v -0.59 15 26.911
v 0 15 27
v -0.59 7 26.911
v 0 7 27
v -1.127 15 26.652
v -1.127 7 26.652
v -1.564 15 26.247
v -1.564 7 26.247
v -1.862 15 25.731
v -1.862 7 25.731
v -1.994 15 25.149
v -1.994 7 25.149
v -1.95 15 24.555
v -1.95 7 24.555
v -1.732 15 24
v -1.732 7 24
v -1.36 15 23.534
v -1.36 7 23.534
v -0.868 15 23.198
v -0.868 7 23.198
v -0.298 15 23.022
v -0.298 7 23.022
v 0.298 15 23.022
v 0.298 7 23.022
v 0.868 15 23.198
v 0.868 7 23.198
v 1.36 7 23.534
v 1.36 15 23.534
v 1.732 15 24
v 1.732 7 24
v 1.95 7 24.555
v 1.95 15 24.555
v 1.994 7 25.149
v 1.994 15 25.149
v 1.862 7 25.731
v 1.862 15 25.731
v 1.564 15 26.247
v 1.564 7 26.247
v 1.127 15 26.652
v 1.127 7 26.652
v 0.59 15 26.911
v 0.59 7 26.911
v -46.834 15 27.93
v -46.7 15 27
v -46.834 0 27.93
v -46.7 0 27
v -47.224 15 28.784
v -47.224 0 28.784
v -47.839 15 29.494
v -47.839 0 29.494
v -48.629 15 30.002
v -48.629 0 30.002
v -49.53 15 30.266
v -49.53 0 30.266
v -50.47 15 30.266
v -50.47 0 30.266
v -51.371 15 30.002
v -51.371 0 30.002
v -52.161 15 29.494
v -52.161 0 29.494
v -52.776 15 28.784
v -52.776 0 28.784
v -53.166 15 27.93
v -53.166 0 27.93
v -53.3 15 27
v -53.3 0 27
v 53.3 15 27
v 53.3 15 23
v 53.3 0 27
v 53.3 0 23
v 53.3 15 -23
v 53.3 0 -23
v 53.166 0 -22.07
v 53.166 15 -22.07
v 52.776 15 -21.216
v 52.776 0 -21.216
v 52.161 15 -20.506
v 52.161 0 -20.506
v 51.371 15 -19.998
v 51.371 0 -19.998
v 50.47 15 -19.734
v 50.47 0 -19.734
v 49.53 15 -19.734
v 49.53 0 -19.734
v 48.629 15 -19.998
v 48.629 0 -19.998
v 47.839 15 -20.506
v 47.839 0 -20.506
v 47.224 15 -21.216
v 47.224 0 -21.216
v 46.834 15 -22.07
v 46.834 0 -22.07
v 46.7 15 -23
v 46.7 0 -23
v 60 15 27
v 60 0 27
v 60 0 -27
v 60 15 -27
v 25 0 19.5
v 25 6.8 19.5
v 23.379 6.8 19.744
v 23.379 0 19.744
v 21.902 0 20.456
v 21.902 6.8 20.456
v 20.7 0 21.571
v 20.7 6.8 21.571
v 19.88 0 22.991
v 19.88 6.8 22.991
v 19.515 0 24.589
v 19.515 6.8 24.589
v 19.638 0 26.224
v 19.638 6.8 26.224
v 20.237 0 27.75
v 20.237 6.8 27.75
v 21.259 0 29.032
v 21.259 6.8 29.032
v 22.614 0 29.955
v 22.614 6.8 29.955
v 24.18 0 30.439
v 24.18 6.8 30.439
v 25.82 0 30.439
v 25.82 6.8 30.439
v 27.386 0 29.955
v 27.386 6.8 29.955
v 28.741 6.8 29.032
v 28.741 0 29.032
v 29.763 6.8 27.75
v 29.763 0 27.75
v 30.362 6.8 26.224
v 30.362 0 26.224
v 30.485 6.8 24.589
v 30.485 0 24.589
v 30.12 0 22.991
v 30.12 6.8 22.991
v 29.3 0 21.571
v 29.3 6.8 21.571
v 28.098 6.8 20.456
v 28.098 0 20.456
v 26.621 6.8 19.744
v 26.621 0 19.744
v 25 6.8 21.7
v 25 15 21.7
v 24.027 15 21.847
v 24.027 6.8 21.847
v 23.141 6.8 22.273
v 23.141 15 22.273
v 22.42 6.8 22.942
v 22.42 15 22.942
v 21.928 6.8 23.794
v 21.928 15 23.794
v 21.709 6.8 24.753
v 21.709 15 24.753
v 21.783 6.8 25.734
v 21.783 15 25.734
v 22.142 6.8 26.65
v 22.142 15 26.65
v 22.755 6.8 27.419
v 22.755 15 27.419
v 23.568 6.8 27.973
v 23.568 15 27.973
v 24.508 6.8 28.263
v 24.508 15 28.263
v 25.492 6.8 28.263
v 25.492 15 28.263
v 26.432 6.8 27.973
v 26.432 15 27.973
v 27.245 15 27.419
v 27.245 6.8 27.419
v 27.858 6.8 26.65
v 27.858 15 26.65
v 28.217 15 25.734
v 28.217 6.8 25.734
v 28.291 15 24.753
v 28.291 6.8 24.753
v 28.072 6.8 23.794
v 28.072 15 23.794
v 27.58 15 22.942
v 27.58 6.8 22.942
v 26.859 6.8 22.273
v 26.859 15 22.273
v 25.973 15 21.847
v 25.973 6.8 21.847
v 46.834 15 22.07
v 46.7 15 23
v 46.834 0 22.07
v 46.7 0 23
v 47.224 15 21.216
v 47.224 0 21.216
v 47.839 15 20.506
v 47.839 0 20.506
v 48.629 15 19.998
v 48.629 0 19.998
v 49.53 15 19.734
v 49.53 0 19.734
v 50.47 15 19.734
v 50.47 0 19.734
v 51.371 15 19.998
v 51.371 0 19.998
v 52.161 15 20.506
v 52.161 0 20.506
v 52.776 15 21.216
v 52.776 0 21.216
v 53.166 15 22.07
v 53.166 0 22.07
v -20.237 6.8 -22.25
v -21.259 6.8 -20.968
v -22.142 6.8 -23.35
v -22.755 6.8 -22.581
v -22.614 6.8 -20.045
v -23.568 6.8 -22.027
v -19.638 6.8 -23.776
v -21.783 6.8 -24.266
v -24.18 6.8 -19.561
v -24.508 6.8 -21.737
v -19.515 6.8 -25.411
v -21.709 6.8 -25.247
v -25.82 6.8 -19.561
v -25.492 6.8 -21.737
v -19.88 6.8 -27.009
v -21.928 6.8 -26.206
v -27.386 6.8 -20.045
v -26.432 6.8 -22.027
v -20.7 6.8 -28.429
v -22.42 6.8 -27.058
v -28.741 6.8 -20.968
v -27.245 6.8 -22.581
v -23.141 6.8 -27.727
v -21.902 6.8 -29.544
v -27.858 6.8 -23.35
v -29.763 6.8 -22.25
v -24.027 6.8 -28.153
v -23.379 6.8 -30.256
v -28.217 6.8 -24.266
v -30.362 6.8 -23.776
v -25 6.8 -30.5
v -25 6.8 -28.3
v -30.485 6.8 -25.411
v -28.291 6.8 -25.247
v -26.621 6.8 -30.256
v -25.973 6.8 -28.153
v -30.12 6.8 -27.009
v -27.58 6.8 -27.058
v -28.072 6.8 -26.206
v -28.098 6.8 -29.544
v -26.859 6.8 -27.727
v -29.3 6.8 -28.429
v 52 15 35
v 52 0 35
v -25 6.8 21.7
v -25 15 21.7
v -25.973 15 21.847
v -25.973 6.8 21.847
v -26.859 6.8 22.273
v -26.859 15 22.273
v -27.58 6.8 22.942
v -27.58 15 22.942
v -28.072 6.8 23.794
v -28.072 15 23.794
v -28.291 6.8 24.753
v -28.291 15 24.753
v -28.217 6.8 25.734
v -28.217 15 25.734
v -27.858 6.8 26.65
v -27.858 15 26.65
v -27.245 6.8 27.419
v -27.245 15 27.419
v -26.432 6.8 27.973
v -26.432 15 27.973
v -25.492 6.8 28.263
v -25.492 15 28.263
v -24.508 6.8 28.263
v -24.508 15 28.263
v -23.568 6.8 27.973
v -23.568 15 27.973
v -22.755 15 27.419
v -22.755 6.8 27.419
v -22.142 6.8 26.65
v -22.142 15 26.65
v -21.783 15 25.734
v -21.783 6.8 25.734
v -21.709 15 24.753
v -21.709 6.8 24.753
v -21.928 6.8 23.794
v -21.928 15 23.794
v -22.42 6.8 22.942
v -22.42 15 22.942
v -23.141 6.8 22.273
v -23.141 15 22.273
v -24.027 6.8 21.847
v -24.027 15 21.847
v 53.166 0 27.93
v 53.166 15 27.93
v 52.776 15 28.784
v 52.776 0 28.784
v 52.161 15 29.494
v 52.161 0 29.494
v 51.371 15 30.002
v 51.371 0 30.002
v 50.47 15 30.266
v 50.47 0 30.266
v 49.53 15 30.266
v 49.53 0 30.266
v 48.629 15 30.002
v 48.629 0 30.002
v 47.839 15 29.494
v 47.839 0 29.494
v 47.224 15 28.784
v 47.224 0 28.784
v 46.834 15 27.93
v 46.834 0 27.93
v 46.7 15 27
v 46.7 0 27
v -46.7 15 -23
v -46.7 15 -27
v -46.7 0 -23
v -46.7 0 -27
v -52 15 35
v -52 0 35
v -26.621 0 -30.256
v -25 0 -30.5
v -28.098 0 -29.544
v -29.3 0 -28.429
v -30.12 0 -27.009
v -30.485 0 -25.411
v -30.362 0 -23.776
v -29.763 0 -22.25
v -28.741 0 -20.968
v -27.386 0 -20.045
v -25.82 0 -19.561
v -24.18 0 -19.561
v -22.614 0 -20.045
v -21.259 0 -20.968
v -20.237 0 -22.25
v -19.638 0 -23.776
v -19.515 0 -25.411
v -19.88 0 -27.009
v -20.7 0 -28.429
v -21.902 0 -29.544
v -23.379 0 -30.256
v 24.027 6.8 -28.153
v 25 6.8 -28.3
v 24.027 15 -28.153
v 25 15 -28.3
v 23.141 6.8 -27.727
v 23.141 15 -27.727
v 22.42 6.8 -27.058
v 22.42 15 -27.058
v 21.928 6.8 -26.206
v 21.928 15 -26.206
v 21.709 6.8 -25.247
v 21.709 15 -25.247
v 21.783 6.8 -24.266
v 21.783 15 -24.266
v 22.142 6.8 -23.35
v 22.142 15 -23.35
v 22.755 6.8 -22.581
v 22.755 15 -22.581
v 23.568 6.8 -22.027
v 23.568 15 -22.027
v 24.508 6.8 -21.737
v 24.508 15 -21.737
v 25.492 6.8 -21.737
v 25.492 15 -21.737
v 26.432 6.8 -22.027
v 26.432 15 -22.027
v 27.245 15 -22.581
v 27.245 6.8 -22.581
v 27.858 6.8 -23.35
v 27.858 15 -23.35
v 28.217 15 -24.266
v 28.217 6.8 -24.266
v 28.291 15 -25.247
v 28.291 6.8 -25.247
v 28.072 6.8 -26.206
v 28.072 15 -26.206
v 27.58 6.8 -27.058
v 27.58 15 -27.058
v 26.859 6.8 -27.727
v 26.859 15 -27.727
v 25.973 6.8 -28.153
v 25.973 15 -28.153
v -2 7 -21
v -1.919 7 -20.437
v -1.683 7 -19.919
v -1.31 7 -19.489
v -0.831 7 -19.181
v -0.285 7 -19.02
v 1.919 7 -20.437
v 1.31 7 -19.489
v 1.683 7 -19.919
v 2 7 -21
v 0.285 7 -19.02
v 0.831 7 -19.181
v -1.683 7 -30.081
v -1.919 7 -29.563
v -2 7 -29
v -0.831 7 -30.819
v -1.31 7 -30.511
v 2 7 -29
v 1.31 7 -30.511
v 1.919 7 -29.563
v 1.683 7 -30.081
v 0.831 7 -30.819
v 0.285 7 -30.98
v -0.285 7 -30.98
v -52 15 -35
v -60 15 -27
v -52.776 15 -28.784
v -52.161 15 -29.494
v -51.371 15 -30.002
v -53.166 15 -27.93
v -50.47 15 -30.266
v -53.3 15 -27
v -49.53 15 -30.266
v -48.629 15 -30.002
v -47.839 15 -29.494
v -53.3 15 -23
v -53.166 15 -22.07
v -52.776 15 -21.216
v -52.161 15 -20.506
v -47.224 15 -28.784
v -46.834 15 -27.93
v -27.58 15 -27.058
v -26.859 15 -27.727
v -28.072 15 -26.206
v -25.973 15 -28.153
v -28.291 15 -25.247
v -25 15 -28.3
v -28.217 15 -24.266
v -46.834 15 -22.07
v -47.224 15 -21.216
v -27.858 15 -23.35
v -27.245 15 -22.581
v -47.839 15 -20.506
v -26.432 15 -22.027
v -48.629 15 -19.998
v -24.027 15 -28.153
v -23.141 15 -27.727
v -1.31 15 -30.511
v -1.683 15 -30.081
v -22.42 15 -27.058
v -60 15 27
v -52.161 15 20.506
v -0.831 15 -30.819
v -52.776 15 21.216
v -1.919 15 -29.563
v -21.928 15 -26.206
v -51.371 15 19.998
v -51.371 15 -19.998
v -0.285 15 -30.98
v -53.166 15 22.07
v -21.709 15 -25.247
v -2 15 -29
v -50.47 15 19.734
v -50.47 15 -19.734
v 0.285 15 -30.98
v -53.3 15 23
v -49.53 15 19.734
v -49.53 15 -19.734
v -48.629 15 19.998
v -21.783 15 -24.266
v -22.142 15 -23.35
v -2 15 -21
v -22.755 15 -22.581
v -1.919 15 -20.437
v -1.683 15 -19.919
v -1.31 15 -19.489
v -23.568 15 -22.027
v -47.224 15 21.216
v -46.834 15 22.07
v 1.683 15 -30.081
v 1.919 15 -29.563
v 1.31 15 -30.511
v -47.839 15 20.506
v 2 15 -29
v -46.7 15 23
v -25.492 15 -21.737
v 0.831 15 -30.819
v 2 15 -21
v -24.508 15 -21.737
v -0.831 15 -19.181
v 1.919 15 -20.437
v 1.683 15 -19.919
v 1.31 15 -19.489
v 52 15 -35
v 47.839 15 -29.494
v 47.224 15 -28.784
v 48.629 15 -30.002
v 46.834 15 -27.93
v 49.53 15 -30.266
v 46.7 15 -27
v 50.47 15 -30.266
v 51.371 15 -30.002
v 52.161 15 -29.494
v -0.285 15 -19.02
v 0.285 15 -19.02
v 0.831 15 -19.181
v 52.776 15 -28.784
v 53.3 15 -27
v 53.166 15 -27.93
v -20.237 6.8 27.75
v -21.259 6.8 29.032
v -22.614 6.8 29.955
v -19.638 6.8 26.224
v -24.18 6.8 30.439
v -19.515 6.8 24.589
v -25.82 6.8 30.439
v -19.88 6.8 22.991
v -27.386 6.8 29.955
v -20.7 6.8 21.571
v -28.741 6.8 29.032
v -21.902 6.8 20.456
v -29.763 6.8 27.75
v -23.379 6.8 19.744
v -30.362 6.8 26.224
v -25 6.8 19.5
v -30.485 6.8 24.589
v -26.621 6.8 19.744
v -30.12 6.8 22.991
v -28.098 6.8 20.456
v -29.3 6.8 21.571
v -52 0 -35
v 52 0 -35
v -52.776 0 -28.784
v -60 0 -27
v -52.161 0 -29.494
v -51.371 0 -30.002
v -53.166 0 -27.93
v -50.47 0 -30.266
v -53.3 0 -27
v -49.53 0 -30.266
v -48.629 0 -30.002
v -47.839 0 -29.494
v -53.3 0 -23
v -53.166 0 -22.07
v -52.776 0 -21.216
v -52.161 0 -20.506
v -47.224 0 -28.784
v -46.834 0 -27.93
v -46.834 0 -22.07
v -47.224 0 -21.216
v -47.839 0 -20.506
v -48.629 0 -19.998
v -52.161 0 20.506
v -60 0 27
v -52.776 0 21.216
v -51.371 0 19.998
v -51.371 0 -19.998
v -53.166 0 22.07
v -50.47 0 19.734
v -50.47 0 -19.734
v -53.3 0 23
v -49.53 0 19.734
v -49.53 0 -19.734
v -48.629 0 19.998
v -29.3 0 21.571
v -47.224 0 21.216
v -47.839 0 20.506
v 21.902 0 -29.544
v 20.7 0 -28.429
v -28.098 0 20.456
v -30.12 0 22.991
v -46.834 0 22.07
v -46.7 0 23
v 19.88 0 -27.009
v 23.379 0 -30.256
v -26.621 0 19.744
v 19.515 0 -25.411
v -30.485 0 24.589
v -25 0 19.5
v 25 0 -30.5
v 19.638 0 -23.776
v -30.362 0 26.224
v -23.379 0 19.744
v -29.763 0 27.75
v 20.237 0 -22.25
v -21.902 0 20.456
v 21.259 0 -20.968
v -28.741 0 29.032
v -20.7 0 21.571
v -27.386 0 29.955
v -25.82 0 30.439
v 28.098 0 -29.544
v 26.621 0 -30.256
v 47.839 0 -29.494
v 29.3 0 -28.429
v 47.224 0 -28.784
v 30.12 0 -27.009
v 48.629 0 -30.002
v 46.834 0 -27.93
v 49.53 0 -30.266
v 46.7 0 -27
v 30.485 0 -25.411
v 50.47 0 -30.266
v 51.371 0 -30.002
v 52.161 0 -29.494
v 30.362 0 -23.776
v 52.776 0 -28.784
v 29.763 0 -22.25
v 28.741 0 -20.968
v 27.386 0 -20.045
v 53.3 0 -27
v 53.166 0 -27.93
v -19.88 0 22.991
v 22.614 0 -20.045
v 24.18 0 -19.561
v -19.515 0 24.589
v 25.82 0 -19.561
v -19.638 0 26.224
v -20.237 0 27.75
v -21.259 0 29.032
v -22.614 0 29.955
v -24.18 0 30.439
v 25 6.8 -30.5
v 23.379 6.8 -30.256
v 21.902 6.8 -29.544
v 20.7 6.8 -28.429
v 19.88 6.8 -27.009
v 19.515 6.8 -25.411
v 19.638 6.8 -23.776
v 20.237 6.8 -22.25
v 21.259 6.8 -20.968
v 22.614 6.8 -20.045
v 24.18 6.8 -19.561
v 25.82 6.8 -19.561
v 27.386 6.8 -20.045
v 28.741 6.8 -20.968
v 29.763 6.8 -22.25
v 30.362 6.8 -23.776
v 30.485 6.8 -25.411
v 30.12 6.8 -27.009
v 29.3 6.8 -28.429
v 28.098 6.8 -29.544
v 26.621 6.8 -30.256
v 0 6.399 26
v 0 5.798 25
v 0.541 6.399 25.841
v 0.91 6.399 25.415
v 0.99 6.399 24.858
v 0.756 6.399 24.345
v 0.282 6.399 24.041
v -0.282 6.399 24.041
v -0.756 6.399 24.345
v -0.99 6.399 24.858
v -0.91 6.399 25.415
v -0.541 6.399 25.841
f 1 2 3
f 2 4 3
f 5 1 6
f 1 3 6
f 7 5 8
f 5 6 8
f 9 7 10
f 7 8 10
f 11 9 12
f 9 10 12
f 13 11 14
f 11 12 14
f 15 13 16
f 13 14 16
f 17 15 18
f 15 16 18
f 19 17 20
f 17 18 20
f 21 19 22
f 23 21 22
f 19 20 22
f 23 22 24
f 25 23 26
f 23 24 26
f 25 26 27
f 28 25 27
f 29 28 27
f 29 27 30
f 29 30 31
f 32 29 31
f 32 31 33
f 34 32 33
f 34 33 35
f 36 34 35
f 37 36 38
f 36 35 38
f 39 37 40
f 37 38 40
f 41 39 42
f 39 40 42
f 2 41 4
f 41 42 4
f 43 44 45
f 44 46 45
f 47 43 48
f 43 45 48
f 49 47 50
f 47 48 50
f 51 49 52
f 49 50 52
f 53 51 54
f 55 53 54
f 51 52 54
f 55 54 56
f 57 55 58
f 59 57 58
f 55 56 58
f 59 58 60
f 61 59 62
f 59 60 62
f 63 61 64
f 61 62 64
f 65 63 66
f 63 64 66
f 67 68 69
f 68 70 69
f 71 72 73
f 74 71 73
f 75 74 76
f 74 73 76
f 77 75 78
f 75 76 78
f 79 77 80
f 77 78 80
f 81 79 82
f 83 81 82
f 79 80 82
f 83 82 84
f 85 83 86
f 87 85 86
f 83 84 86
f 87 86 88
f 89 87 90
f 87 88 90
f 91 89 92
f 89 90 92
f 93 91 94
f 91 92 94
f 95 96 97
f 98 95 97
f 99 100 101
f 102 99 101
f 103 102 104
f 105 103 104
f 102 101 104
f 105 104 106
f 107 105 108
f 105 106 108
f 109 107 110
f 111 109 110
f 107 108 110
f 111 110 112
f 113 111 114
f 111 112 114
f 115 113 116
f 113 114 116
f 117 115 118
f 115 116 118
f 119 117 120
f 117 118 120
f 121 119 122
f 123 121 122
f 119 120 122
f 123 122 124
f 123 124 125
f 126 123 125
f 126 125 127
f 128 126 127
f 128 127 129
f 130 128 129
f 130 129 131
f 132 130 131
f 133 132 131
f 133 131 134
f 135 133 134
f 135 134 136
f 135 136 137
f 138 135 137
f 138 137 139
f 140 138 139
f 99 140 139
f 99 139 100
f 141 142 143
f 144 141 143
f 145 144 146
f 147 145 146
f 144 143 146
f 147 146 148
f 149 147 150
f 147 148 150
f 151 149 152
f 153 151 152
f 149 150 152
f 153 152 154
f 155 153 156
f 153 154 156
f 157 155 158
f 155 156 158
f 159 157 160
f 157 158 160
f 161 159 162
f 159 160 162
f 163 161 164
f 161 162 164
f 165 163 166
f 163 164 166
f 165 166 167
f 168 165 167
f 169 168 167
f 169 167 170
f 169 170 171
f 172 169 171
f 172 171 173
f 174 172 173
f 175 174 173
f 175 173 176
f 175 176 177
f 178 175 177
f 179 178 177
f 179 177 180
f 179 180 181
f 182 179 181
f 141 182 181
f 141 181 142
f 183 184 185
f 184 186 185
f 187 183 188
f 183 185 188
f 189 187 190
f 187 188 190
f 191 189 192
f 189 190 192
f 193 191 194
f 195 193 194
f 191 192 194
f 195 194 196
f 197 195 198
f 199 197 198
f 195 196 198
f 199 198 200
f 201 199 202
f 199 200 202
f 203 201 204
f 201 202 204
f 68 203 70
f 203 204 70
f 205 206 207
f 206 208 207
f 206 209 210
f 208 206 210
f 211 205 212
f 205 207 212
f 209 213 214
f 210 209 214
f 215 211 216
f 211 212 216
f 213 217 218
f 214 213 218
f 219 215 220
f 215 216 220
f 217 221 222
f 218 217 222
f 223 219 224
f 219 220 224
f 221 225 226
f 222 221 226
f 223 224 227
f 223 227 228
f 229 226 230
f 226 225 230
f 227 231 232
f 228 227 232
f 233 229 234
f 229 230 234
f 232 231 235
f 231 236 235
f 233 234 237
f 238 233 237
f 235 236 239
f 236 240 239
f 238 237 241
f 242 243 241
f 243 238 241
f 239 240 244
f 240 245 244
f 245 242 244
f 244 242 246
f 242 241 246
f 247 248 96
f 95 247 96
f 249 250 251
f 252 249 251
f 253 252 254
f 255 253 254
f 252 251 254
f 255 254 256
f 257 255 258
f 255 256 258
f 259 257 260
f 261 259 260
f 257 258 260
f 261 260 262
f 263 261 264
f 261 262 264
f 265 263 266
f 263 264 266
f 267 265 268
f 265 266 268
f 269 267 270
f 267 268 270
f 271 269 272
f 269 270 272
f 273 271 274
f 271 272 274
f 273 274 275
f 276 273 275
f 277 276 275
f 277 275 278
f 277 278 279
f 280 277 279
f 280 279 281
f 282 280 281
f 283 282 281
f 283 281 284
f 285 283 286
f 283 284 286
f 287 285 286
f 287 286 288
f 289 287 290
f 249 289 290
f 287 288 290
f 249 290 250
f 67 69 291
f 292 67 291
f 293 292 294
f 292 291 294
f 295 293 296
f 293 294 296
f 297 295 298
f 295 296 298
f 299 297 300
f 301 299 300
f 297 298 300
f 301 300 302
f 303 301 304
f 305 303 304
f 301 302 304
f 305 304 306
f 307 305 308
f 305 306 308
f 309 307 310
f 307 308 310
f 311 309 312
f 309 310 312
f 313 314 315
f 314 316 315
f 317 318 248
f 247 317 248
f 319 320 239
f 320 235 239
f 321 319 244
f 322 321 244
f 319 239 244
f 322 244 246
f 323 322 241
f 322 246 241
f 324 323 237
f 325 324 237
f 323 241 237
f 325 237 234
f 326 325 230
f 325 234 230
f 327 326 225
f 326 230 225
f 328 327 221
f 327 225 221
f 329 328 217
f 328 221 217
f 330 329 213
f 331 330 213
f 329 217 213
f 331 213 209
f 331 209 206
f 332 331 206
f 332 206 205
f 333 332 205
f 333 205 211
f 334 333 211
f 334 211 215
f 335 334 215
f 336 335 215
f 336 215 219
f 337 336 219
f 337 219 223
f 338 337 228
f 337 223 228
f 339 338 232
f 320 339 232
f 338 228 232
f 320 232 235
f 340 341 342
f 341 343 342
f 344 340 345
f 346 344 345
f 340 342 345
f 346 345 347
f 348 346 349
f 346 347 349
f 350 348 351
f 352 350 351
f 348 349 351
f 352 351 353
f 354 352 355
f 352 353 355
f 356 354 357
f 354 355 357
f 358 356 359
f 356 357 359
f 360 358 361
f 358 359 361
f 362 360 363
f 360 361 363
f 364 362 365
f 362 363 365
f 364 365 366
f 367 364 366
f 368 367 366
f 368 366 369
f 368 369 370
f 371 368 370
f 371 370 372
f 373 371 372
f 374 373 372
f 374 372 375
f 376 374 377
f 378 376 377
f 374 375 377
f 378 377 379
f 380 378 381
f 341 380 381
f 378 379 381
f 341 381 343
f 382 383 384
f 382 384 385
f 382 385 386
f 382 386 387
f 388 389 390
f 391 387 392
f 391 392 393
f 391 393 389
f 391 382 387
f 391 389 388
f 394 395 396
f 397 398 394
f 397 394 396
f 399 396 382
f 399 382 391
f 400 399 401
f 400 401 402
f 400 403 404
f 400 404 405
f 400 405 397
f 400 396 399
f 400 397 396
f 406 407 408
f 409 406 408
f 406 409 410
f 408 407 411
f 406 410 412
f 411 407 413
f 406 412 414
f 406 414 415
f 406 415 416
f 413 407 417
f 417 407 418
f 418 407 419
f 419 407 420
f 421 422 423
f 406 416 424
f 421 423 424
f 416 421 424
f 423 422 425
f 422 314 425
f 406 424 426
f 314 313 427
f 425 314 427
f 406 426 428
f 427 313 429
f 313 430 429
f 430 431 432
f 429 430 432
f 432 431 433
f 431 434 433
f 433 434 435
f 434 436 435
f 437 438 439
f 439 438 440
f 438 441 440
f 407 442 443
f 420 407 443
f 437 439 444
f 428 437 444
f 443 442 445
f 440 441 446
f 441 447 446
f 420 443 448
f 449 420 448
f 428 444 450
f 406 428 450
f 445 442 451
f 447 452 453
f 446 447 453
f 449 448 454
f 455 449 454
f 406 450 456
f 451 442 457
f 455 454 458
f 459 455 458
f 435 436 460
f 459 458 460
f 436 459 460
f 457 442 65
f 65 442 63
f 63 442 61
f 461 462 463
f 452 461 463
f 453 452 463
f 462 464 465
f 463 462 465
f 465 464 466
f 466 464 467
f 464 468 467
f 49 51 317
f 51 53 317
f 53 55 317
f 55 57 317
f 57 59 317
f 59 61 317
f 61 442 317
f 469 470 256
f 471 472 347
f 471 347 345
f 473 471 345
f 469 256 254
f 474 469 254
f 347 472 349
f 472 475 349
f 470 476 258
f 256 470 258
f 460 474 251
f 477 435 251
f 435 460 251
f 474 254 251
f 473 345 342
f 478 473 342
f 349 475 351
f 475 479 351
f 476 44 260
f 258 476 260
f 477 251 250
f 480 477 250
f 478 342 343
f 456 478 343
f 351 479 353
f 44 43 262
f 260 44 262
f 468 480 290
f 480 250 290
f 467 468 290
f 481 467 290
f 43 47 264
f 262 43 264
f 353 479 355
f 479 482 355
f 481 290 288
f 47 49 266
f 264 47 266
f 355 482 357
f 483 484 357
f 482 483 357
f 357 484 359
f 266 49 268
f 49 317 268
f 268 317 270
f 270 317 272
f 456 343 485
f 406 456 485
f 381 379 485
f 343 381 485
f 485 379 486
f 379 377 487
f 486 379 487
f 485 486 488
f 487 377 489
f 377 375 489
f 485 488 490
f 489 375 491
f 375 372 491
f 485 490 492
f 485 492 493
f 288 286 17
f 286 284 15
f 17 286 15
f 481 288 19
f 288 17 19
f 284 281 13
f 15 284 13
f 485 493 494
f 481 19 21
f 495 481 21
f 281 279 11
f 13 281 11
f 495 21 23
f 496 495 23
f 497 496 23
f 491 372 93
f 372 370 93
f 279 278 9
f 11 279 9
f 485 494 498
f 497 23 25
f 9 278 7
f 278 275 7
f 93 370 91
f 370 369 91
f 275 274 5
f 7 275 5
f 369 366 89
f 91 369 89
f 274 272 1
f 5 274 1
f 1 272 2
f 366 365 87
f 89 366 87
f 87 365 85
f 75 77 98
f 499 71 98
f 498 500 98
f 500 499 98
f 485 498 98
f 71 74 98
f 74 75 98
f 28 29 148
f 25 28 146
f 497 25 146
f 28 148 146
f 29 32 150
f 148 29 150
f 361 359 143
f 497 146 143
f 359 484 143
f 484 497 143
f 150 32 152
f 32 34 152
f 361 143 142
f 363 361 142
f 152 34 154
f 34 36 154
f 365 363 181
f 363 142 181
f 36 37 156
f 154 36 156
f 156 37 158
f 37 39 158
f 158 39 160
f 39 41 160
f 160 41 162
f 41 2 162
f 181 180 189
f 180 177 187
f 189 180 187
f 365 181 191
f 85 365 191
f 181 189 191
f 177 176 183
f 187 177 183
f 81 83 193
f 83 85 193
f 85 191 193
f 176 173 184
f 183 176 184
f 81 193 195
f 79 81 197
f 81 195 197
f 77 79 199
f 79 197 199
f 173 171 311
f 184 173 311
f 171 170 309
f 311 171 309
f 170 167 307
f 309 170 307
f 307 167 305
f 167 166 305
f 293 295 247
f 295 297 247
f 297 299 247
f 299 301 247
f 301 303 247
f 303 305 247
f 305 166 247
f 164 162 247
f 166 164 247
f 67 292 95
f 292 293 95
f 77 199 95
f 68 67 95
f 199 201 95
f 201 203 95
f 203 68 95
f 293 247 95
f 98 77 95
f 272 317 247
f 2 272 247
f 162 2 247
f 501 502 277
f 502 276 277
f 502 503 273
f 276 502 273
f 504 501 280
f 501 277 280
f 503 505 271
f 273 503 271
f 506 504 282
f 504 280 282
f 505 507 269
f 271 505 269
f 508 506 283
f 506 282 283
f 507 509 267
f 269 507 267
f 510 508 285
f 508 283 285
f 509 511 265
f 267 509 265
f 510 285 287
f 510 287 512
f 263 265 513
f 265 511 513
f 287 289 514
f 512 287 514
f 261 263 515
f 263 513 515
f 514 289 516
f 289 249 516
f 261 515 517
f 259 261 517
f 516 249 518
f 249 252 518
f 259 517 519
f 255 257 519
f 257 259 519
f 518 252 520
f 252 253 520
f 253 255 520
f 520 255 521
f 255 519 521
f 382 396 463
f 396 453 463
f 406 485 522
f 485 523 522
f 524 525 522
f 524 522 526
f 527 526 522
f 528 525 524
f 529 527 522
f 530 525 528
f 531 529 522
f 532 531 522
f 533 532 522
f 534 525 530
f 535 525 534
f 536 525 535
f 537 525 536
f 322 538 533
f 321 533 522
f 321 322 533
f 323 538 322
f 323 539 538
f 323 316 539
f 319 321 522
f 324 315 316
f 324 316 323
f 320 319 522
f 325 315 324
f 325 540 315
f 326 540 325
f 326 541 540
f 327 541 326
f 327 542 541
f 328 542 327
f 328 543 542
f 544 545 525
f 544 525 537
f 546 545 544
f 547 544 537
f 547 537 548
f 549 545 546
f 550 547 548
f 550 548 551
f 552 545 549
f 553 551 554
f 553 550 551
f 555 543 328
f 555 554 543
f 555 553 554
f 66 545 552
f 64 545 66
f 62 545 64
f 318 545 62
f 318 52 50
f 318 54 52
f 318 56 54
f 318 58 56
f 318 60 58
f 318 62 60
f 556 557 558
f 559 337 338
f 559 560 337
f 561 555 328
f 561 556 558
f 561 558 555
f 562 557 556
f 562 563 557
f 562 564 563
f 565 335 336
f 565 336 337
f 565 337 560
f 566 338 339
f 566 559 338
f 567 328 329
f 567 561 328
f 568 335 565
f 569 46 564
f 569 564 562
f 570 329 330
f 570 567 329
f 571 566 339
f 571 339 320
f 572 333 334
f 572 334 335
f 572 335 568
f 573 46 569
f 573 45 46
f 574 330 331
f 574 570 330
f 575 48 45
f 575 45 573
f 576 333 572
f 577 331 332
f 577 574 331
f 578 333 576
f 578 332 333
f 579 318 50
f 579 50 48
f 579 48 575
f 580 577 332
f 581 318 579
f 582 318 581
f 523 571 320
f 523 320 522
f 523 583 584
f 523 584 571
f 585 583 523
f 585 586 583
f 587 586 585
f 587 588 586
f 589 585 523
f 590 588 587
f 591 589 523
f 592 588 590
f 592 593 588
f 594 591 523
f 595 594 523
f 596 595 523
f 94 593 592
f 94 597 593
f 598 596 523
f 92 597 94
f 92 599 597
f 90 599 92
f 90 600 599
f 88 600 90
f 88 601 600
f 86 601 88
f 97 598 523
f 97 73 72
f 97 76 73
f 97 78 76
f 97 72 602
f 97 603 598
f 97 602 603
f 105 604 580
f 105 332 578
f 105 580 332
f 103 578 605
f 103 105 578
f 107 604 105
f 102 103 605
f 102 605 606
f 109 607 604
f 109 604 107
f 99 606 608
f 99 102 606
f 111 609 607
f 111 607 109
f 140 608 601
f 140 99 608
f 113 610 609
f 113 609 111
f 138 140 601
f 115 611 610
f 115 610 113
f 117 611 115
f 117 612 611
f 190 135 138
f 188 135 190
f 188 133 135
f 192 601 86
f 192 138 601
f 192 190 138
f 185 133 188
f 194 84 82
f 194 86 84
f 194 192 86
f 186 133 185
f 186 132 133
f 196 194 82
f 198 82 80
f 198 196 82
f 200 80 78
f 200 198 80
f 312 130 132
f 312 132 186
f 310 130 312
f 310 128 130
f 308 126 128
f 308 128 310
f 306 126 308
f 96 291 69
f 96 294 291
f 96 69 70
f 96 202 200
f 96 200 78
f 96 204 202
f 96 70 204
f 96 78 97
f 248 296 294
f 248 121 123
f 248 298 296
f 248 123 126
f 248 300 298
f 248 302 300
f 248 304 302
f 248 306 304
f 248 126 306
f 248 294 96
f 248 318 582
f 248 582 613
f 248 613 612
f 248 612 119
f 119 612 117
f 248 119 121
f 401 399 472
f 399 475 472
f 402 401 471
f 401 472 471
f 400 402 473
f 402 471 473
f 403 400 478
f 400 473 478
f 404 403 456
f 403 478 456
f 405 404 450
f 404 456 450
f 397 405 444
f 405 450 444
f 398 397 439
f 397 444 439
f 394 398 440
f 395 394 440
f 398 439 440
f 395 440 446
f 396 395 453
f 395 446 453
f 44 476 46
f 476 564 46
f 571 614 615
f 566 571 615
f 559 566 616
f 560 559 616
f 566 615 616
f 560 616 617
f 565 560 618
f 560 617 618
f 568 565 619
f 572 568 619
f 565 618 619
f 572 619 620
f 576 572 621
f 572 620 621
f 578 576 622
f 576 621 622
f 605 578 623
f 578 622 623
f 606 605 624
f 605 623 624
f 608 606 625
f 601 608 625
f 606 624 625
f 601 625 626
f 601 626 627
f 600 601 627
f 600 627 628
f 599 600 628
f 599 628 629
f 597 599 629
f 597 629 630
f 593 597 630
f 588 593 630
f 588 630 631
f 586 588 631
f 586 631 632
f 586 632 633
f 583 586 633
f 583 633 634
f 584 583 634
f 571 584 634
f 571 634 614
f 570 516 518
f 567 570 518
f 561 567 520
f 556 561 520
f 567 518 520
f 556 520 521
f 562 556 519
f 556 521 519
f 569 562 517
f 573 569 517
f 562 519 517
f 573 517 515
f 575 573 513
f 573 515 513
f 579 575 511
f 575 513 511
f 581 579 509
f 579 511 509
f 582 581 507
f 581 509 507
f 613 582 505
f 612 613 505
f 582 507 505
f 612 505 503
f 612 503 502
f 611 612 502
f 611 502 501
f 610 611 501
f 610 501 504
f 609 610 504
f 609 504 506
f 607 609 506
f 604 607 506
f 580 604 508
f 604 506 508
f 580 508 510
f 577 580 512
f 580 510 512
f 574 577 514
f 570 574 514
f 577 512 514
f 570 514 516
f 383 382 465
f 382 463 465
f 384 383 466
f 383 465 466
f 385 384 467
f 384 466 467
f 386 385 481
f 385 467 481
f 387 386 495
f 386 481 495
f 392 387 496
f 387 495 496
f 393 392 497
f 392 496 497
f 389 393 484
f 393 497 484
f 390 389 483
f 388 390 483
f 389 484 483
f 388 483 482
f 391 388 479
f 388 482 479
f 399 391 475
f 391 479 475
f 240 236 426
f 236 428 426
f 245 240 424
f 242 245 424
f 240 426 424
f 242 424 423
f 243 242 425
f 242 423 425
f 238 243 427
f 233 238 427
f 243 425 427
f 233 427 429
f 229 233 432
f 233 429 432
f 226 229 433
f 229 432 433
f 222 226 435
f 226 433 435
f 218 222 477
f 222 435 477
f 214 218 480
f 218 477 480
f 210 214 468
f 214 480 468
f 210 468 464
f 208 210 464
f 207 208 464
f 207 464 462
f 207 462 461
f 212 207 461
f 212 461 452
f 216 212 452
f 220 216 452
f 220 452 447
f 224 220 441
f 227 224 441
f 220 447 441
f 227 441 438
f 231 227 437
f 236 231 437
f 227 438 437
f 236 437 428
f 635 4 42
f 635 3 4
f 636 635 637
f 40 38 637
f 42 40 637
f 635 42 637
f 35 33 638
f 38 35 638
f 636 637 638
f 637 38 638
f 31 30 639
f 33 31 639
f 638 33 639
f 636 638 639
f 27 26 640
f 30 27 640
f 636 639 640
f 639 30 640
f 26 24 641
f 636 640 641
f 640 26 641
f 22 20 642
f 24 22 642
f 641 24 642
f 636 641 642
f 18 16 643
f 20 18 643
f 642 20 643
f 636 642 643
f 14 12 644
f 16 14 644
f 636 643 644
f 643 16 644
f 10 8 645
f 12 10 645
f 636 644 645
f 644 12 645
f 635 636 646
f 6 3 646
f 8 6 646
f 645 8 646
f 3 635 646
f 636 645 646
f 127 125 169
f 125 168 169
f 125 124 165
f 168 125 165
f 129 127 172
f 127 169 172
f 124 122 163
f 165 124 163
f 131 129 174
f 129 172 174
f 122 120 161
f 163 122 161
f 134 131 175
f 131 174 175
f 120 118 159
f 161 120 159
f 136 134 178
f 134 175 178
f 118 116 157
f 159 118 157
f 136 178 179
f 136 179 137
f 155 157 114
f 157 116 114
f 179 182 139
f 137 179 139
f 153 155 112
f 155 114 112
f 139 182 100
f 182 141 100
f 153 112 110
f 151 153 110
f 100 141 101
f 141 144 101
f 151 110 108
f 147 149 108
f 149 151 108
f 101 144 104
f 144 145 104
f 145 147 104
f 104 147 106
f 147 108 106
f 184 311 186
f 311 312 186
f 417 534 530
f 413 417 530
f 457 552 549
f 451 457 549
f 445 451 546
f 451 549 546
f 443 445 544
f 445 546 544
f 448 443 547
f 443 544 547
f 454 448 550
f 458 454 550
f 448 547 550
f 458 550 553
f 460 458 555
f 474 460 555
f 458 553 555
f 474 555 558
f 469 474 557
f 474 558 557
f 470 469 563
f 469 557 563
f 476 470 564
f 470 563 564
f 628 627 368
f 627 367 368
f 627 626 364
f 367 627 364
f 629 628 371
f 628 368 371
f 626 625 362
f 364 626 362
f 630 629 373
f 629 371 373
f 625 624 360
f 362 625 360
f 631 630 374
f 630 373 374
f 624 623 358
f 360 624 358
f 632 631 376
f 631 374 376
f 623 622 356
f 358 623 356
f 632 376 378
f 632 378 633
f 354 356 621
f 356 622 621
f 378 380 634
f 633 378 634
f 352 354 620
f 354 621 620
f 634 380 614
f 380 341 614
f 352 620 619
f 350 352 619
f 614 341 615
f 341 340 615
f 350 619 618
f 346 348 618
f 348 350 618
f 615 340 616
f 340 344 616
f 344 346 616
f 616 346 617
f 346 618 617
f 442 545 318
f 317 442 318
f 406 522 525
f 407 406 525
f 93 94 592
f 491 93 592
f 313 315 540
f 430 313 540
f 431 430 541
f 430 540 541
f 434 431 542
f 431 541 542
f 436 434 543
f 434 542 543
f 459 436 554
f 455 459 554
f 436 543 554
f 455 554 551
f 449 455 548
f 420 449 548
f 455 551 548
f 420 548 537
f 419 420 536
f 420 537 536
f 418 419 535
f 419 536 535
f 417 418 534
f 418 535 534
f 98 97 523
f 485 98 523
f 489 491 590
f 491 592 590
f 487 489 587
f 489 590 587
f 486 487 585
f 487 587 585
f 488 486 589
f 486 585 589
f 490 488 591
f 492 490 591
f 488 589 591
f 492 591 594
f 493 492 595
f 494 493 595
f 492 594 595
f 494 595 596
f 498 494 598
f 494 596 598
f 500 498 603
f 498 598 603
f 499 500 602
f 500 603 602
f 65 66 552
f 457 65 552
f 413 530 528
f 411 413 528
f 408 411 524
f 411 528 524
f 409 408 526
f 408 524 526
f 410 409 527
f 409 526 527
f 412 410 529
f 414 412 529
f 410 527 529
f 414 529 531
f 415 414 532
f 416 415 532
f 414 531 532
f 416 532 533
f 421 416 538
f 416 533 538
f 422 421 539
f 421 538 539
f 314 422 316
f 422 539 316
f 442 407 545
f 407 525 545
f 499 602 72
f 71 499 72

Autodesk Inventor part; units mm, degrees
ref_plane "YZ Plane" through (0, 0, 0) normal (1, 0, 0) x (0, 1, 0)
ref_plane "XZ Plane" through (0, 0, 0) normal (0, 1, 0) x (-1, 0, 0)
ref_plane "XY Plane" through (0, 0, 0) normal (0, 0, 1) x (1, 0, 0)
sketch "Sketch1" plane through (-52, 0, -35) normal (0, -1, 0) x (1, 0, 0)
  line L0 (0, 70) -> (104, 70) projected
  line L1 (104, 70) -> (112, 62) projected
  line L2 (112, 62) -> (112, 8) projected
  line L3 (112, 8) -> (104, 0) projected
  line L4 (104, 0) -> (0, 0) projected
  line L5 (0, 0) -> (-8, 8) projected
  line L6 (-8, 8) -> (-8, 62) projected
  line L7 (-8, 62) -> (0, 70) projected
  circle A0 centre (27, 10) radius 5.5 projected
  circle A1 centre (27, 60) radius 5.5 projected
  circle A2 centre (77, 60) radius 5.5 projected
  circle A3 centre (77, 10) radius 5.5 projected
  circle A4 centre (52, 60) radius 2 projected
  arc A5 (50, 6) -> (54, 6) centre (52, 6) ccw projected
  line L8 (54, 6) -> (54, 14) projected
  arc A6 (54, 14) -> (50, 14) centre (52, 14) ccw projected
  line L9 (50, 14) -> (50, 6) projected
  circle A7 centre (77, 35) radius 2 projected
  arc A8 (23, 37) -> (23, 33) centre (23, 35) ccw projected
  line L10 (23, 33) -> (31, 33) projected
  arc A9 (31, 33) -> (31, 37) centre (31, 35) ccw projected
  line L11 (31, 37) -> (23, 37) projected
  arc A10 (66.5, 62.5) -> (62.5, 62.5) centre (64.5, 62.5) ccw projected
  line L12 (62.5, 62.5) -> (62.5, 7.5) projected
  arc A11 (62.5, 7.5) -> (66.5, 7.5) centre (64.5, 7.5) ccw projected
  line L13 (66.5, 7.5) -> (66.5, 62.5) projected
  arc A12 (105.3, 62) -> (98.7, 62) centre (102, 62) ccw projected
  line L14 (98.7, 62) -> (98.7, 58) projected
  arc A13 (98.7, 58) -> (105.3, 58) centre (102, 58) ccw projected
  line L15 (105.3, 58) -> (105.3, 62) projected
  arc A14 (5.3, 62) -> (-1.3, 62) centre (2, 62) ccw projected
  line L16 (-1.3, 62) -> (-1.3, 58) projected
  arc A15 (-1.3, 58) -> (5.3, 58) centre (2, 58) ccw projected
  line L17 (5.3, 58) -> (5.3, 62) projected
  arc A16 (-1.3, 8) -> (5.3, 8) centre (2, 8) ccw projected
  line L18 (5.3, 8) -> (5.3, 12) projected
  arc A17 (5.3, 12) -> (-1.3, 12) centre (2, 12) ccw projected
  line L19 (-1.3, 12) -> (-1.3, 8) projected
  arc A18 (98.7, 8) -> (105.3, 8) centre (102, 8) ccw projected
  line L20 (105.3, 8) -> (105.3, 12) projected
  arc A19 (105.3, 12) -> (98.7, 12) centre (102, 12) ccw projected
  line L21 (98.7, 12) -> (98.7, 8) projected
  point P0 (52, 35)
extrude "Extrusion1" add sketch "Sketch1" against normal up to surface (15 mm away) contours L0 L1 L2 L3 L4 L5 L6 L7 | A0 | A1 | A2 | A3 | A4 | L9 A6 L8 A5 | A7 | L11 A9 L10 A8 | L13 A11 L12 A10 | L15 A13 L14 A12 | L17 A15 L16 A14 | L19 A17 L18 A16 | L21 A19 L20 A18
hole "M6CBore" at (25, 0, -25) at (-25, 0, -25) at (-25, 0, 25) at (25, 0, 25) direction (0, 1, 0) diameter 6.6 end through all counterbore diameter 11 counterbore depth 6.8 clearance for "Socket Head Cap Screw ISO 4762" size "M6" standard "ISO"
extrude "M6ClearanceSlots" cut sketch "Sketch1" against normal through all contours L15 A13 L14 A12 | L17 A15 L16 A14 | L19 A17 L18 A16 | L21 A19 L20 A18
sketch "Sketch2" plane through (-52, 15, -35) normal (0, 1, 0) x (1, 0, 0)
  line L0 (52, -14) -> (52, -6) construction
  line L1 (54, -14) -> (54, -6)
  line L2 (50, -6) -> (50, -14)
  arc A0 (50, -14) -> (54, -14) centre (52, -14) ccw
  arc A1 (54, -6) -> (50, -6) centre (52, -6) ccw
  point P0 (52, -35)
  point P1 (52, -60)
  point P2 (52, -10)
  dimension "d11" = 4
hole "Hole2" at (0, 15, 25) direction (0, -1, 0) diameter 4 depth 8 tip angle 118
extrude "Extrusion3" cut sketch "Sketch2" against normal blind 8
properties part number "FAB-P0001" material "SolidWorks Materials|6061-T6 (SS)"
